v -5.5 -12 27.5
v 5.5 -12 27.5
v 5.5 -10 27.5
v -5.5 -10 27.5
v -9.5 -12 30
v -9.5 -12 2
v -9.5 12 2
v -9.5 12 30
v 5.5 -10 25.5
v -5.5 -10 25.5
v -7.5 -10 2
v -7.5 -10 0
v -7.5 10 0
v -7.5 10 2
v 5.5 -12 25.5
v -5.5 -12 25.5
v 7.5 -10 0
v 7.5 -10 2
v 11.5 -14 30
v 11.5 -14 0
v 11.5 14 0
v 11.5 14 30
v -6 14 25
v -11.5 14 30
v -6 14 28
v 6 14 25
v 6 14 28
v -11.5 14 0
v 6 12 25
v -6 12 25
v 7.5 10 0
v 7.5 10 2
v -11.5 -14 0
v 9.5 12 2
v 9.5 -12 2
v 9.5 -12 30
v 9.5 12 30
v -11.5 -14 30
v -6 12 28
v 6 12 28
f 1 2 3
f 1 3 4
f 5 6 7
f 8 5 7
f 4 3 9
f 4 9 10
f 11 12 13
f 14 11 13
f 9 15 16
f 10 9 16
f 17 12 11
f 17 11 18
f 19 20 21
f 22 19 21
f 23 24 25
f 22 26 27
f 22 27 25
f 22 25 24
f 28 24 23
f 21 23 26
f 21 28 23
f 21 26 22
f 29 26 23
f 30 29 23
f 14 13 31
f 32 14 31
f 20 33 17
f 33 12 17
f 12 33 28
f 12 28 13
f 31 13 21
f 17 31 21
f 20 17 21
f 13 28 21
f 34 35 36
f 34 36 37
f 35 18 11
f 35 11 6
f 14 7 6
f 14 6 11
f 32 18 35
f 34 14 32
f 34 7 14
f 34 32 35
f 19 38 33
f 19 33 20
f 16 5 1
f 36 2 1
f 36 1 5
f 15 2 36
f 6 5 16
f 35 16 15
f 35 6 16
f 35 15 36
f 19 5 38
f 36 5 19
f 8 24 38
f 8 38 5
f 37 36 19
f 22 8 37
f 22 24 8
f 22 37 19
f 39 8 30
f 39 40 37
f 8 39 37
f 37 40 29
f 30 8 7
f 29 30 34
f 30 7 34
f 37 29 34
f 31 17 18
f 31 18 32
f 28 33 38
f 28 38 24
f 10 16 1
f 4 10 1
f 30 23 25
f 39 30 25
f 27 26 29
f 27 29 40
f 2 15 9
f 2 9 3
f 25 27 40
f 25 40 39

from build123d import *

# Parameters (mm, degrees)
F0_W     = 23
F0_H     = 28
F0_W_2   = 19
F0_H_2   = 24
F0_W_3   = 15
F0_H_3   = 20
F1_DEPTH = 2
F2_DEPTH = 25
F3_DEPTH = 30
F4_W     = 12
F4_H     = 3
F5_DEPTH = 5
F6_W     = 11
F6_H     = 2
F7_DEPTH = 2


with BuildPart() as f1:
    # F0 (on Top) → F1 (new body)
    with BuildSketch(Plane.XY):
        Rectangle(F0_W, F0_H)
        Rectangle(F0_W_2, F0_H_2, mode=Mode.SUBTRACT)
        Rectangle(F0_W_2, F0_H_2)
        Rectangle(F0_W_3, F0_H_3, mode=Mode.SUBTRACT)
        Rectangle(F0_W_3, F0_H_3)
    extrude(amount=F1_DEPTH)

    # F0 (on Top) → F2 (cut)
    with BuildSketch(Plane.XY):
        Rectangle(F0_W_3, F0_H_3)
    extrude(amount=F2_DEPTH, mode=Mode.SUBTRACT)

    # F0 (on Top) → F3 (join)
    with BuildSketch(Plane.XY):
        Rectangle(F0_W, F0_H)
        Rectangle(F0_W_2, F0_H_2, mode=Mode.SUBTRACT)
    extrude(amount=F3_DEPTH)

    # F4 (on face) → F5 (cut)
    with BuildSketch(Plane(origin=(0, 14, 0), x_dir=(-1, 0, 0), z_dir=(0, 1, 0))):
        with Locations((0, 26.5)):
            Rectangle(F4_W, F4_H)
    extrude(amount=-F5_DEPTH, mode=Mode.SUBTRACT)

    # F6 (on face) → F7 (join)
    with BuildSketch(Plane(origin=(0, -12, 0), x_dir=(-1, 0, 0), z_dir=(0, 1, 0))):
        with Locations((0, 26.5)):
            Rectangle(F6_W, F6_H)
    extrude(amount=F7_DEPTH)


solid = f1.part
